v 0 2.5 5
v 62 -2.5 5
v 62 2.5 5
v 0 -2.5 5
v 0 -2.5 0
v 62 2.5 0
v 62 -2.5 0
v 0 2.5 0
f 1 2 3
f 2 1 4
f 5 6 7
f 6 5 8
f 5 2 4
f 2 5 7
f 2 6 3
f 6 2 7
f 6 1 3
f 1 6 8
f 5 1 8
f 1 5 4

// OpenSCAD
// file: Library/center.scad
module center(axis){
	translate((axis / -2.0)){
		children();
	}
}
// main file
use <Library/center.scad>

//This rod is positive space for the full ejector rod, and negative space that gets cut out of the dispenser.

//Length, width, and height of rod. Length should include the thiccness of the paddle.
dimensions = [30+2+30, 5, 5];

module CylinderDispenser_Ejector_Rod(dimensions){
	center([0, dimensions.y, 0]){
		cube(dimensions);
	}
}

CylinderDispenser_Ejector_Rod(dimensions);
